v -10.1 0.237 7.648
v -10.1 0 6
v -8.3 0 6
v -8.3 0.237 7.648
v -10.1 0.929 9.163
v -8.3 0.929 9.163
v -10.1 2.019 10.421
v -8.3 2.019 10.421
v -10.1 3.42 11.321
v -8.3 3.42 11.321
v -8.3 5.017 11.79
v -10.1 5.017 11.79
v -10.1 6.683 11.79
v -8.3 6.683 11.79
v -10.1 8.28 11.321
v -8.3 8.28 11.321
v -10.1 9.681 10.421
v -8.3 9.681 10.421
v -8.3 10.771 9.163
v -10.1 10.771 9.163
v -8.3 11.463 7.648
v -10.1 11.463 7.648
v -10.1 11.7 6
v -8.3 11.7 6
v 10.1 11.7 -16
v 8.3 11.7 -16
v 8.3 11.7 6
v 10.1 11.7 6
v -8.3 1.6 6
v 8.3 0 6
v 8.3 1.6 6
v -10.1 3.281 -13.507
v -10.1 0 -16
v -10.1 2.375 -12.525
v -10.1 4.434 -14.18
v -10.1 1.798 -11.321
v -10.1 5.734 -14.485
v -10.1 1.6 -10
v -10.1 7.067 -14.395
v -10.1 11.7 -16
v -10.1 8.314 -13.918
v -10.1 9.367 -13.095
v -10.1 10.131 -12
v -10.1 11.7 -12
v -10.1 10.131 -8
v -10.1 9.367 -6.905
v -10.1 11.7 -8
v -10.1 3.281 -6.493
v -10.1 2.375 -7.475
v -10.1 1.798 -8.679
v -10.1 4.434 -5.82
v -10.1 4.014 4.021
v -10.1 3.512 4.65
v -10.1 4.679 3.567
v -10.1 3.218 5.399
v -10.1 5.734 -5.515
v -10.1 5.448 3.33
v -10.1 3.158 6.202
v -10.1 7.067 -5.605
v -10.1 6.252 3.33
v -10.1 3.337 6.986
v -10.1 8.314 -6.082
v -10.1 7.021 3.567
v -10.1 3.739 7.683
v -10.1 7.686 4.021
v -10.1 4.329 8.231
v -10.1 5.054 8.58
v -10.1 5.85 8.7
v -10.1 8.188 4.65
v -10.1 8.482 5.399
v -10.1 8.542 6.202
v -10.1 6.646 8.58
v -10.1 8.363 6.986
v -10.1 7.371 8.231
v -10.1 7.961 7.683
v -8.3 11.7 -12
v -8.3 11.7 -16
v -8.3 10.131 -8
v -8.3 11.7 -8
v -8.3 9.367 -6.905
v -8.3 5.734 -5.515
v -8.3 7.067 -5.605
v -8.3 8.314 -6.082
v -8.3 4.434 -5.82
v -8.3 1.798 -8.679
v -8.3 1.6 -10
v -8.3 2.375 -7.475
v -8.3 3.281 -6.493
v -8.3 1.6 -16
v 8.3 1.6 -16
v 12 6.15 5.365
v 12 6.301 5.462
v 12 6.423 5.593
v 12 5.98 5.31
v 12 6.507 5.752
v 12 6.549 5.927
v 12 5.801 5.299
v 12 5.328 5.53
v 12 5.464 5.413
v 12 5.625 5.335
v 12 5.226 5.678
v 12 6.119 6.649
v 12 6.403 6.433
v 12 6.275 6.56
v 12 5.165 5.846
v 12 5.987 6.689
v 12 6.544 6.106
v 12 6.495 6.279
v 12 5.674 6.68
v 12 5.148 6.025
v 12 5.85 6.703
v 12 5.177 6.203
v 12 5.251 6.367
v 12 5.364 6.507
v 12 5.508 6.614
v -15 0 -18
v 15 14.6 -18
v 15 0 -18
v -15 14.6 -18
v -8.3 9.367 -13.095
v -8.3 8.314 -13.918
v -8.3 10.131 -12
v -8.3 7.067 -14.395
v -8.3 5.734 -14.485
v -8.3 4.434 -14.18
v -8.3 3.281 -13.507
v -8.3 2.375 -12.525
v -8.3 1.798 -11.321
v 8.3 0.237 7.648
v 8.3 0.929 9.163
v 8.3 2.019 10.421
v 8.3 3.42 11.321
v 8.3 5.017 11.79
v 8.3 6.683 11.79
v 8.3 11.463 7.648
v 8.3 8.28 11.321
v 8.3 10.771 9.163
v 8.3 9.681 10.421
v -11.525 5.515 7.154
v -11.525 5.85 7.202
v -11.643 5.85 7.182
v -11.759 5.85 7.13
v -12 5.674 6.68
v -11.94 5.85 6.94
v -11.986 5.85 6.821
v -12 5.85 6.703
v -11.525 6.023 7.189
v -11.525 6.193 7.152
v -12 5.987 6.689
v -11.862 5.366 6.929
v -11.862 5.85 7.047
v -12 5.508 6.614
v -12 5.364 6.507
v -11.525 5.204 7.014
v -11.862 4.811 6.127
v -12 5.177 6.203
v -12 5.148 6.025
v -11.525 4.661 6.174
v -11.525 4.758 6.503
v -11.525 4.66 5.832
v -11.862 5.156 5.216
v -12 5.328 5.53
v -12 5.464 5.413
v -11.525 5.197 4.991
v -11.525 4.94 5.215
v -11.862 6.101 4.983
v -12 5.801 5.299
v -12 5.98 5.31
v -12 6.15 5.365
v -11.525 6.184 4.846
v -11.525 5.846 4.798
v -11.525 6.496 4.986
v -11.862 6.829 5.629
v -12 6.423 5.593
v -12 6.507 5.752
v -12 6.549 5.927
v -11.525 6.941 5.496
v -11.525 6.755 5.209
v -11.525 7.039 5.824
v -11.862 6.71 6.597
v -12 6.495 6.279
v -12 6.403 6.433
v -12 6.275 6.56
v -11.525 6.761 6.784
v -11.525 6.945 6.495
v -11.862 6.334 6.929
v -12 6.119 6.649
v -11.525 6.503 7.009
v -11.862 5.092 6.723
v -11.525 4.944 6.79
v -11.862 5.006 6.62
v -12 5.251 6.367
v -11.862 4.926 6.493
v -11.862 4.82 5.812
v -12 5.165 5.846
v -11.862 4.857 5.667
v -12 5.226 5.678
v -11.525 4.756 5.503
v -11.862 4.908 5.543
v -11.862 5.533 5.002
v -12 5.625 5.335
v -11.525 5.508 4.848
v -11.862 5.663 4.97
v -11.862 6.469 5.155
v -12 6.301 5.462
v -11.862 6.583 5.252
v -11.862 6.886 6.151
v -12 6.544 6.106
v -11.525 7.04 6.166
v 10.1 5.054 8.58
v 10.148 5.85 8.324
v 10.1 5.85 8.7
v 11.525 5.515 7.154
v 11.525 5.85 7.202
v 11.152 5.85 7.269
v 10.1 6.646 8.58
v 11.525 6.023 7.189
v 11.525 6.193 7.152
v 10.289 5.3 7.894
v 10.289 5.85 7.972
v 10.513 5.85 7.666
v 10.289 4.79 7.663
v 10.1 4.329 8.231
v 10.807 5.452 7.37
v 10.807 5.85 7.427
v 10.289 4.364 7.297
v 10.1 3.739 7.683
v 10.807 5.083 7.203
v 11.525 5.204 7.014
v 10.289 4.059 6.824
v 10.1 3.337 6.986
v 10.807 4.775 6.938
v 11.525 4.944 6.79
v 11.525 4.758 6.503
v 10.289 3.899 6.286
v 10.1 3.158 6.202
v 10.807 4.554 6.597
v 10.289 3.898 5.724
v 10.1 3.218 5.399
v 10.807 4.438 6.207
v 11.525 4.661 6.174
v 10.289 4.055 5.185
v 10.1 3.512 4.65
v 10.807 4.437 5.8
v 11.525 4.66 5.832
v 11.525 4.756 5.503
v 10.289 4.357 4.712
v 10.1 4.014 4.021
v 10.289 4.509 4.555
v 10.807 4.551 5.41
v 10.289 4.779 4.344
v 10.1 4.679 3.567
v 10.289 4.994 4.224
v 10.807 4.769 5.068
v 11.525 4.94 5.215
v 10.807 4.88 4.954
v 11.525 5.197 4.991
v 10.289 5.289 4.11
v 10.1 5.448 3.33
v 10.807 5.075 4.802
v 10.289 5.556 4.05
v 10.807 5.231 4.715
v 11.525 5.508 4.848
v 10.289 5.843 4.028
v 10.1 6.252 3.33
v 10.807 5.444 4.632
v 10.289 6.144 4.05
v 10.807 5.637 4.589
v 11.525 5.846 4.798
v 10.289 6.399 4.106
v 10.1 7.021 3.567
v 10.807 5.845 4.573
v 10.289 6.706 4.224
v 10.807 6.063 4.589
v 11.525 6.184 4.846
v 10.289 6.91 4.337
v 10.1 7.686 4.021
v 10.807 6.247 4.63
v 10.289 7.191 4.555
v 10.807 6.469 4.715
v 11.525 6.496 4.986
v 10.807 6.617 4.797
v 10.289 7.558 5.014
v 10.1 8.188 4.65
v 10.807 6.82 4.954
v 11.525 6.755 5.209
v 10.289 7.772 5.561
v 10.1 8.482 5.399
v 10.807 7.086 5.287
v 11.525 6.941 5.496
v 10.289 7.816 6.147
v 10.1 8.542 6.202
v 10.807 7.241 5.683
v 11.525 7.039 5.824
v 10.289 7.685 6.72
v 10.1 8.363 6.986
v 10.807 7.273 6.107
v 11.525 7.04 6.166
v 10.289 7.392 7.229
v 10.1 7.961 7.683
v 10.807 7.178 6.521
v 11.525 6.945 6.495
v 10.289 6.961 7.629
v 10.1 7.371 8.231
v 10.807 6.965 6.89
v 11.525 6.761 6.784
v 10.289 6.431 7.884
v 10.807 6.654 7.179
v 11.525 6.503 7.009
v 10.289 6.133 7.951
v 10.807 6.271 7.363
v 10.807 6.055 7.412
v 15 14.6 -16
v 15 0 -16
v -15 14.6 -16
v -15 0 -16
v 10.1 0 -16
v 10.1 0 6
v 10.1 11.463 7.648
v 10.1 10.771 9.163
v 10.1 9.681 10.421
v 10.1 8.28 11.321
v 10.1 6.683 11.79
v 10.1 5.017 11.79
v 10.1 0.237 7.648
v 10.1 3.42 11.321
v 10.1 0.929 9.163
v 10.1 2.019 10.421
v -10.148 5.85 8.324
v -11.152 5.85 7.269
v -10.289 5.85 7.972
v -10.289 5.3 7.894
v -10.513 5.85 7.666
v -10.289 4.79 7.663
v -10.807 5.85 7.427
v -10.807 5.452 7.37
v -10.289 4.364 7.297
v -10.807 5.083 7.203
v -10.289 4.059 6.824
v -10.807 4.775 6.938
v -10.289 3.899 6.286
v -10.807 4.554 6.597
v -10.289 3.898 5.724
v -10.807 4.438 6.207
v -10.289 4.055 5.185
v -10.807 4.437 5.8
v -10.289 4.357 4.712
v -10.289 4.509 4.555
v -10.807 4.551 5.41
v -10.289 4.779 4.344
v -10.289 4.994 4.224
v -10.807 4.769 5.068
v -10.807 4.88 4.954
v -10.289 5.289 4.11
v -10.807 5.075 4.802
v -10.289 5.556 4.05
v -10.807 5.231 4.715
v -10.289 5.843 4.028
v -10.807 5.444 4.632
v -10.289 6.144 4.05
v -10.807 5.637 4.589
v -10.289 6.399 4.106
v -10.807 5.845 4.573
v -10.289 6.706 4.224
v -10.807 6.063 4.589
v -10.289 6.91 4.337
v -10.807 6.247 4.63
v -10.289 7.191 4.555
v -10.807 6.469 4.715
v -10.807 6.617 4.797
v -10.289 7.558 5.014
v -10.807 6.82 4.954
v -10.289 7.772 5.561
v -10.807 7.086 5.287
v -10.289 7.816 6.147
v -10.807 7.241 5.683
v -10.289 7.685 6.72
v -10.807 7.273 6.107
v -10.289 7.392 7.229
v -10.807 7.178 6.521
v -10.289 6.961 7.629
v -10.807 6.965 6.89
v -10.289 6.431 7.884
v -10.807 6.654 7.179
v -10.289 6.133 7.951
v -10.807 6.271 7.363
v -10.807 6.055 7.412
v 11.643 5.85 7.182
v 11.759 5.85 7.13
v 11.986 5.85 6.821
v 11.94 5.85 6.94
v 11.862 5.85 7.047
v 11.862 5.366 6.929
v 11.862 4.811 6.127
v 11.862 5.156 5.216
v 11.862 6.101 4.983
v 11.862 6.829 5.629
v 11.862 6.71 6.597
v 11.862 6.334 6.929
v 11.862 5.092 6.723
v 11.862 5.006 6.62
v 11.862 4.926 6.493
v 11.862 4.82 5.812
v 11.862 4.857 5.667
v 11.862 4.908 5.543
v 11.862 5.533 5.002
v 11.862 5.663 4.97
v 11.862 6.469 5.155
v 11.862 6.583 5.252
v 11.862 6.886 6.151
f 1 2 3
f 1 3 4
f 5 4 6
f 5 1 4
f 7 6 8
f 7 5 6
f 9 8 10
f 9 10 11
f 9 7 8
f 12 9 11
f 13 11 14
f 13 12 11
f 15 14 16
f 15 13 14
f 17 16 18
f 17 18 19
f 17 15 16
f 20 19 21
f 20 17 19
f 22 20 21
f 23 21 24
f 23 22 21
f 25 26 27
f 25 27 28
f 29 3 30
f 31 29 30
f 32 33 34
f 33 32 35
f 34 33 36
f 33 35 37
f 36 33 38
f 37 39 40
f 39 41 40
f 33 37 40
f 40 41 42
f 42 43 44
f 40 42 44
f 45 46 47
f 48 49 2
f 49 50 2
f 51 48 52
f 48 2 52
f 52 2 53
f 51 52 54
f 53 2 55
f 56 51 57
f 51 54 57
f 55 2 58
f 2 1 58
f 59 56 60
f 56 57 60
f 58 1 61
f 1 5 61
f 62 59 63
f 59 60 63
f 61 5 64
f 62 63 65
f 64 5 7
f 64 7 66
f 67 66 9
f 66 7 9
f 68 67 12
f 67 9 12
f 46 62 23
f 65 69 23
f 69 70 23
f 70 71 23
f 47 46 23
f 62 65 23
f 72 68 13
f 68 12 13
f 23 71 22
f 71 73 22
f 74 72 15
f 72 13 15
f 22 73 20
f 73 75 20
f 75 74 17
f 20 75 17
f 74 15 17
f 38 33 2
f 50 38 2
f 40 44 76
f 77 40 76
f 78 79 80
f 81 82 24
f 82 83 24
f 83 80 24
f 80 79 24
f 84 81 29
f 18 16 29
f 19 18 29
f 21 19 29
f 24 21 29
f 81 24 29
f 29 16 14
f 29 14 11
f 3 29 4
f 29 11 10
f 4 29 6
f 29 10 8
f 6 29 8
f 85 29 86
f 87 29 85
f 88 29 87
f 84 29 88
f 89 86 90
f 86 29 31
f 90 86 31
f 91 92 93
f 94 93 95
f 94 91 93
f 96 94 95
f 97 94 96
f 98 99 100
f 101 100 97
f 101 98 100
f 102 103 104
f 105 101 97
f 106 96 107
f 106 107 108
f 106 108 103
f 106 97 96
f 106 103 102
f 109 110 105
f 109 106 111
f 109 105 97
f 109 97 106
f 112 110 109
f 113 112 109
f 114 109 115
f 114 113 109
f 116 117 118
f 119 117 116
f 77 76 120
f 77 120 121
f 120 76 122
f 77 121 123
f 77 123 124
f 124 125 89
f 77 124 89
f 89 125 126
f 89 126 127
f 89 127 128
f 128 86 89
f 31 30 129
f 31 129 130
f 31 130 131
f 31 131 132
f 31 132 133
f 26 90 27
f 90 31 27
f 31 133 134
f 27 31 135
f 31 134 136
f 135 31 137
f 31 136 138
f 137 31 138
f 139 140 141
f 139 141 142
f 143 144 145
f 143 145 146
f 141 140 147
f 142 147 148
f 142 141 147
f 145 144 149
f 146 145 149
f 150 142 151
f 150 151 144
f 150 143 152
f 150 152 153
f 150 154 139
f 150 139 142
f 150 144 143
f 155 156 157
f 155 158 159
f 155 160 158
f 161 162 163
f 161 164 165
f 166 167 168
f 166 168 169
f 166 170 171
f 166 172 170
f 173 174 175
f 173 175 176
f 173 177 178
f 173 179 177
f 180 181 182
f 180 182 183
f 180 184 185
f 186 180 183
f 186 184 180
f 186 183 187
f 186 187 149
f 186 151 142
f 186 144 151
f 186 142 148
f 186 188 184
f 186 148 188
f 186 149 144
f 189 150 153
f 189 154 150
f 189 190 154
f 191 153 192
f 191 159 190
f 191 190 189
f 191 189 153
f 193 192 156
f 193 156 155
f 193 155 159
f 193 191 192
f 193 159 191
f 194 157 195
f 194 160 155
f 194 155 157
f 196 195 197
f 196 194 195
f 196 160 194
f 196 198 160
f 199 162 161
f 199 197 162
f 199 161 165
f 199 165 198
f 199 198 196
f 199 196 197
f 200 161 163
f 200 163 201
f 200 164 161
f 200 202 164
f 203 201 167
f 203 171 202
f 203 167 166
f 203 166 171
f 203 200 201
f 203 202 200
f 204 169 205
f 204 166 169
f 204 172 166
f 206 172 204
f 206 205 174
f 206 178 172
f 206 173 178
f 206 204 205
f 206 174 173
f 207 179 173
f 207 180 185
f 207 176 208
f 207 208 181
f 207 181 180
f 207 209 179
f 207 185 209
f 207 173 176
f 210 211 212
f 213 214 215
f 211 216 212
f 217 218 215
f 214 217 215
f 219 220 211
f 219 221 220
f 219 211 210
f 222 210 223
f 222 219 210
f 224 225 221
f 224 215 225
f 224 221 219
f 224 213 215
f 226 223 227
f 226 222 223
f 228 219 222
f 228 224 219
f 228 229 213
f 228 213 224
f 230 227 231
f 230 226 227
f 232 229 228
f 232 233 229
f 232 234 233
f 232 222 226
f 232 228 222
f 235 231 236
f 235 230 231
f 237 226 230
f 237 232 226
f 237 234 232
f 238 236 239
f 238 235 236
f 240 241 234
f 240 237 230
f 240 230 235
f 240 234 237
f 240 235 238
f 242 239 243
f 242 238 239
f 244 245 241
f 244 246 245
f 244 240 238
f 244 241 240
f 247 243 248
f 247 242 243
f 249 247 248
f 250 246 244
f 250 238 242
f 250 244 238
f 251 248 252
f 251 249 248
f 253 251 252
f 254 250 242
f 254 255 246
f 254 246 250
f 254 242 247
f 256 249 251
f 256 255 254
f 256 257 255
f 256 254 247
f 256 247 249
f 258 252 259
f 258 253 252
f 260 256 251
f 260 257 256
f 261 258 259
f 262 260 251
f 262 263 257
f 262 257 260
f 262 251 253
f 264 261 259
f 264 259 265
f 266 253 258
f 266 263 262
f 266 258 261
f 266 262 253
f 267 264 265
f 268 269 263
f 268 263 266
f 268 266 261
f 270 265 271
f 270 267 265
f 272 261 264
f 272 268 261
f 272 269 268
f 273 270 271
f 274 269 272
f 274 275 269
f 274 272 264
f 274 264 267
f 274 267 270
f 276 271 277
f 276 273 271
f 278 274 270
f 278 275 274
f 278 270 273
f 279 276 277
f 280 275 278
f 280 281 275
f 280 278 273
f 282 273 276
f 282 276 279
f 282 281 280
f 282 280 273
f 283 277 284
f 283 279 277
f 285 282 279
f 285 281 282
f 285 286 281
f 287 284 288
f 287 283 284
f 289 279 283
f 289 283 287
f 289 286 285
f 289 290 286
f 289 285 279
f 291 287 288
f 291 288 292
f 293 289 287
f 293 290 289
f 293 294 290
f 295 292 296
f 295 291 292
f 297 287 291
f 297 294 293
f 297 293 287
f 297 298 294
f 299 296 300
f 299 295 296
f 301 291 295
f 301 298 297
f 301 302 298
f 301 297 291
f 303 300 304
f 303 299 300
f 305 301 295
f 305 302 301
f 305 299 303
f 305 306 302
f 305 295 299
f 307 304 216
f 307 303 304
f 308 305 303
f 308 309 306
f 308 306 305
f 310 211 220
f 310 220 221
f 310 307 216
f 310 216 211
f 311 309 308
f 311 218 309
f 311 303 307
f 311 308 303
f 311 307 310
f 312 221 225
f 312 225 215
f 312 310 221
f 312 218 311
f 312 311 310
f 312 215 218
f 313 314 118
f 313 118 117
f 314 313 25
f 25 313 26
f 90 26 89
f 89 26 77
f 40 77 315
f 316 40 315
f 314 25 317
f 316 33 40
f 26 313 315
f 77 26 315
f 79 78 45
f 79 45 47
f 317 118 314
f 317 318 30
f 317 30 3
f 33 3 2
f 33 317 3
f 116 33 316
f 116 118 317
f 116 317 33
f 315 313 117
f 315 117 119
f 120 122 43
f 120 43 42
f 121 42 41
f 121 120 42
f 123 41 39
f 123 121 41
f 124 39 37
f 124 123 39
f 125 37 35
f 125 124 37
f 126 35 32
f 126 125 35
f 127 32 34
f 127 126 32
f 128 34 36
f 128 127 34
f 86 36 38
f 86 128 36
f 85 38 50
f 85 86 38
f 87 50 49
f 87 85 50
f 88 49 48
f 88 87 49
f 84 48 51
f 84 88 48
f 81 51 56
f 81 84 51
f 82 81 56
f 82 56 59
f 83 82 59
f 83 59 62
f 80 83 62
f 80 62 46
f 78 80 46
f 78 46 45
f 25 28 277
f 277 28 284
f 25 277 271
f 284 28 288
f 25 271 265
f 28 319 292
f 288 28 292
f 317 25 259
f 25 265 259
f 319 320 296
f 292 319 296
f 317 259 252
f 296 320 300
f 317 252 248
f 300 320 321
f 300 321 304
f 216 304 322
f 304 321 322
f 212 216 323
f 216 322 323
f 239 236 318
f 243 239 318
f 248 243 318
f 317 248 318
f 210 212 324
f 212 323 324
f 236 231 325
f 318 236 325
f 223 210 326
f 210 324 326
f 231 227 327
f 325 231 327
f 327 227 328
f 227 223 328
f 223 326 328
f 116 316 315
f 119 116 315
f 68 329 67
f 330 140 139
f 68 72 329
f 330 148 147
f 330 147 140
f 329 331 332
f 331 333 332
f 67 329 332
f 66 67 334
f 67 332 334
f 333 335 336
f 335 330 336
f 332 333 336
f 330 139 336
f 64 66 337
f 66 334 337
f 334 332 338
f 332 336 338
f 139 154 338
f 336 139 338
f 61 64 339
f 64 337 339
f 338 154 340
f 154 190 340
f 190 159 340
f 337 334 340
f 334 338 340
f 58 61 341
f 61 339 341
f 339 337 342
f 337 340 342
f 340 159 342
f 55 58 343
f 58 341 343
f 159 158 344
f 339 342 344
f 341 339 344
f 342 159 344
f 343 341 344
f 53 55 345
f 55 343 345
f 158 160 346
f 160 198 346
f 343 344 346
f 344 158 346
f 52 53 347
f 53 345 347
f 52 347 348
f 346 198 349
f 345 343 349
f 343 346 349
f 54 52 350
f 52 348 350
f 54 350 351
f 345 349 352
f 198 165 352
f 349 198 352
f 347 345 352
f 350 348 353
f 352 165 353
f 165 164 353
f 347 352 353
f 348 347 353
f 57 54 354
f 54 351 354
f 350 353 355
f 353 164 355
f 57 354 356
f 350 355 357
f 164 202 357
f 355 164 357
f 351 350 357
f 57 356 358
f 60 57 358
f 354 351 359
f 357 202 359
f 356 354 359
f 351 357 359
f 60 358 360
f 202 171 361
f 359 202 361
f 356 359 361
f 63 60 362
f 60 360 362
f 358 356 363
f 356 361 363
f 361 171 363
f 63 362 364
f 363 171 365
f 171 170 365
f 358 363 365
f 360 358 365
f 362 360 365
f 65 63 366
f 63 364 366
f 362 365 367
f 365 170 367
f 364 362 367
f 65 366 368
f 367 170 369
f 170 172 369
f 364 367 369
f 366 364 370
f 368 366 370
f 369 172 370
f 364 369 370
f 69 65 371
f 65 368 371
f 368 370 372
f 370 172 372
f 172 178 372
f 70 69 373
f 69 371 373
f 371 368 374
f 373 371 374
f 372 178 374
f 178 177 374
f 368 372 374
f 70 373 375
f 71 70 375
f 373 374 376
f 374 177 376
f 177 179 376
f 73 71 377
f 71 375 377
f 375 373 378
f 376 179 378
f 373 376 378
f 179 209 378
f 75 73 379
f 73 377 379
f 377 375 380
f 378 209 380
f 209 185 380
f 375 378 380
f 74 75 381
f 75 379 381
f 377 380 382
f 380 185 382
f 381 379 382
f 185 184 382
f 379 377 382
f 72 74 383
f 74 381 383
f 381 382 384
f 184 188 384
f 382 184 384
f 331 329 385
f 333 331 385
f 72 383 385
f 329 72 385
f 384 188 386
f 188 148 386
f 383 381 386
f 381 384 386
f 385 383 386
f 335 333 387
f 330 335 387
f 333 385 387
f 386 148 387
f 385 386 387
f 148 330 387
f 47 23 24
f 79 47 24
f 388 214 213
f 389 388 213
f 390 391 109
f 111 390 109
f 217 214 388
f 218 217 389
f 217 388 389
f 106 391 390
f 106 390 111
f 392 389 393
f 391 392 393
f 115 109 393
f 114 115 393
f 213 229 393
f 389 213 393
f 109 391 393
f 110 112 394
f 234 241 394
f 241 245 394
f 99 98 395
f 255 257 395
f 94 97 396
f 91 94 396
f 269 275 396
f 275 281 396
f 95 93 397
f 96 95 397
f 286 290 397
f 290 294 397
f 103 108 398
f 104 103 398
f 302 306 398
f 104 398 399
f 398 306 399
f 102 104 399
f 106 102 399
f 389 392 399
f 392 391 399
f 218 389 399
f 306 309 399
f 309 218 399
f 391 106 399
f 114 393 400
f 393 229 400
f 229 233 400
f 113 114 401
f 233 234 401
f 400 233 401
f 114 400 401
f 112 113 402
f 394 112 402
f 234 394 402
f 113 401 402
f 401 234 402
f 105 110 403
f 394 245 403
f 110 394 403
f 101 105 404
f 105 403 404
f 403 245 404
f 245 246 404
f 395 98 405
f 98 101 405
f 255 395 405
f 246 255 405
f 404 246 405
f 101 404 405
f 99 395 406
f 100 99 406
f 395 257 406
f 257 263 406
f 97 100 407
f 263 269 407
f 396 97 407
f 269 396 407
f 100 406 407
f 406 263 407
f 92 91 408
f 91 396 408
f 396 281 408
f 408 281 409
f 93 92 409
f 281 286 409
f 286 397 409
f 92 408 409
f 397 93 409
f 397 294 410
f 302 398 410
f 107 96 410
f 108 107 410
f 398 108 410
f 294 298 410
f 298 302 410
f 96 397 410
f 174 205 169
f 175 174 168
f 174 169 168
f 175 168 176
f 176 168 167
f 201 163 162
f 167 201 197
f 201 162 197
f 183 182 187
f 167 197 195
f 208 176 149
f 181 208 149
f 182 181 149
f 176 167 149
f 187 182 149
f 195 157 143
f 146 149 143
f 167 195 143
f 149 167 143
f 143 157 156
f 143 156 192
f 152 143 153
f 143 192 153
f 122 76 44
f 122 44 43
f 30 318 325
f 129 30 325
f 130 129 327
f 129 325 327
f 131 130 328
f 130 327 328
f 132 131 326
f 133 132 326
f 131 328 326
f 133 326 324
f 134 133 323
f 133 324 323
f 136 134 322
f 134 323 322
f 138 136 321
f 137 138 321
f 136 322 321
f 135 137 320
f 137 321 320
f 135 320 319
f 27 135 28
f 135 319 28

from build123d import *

# Parameters (mm, degrees)
SKETCH1_W           = 20.2
SKETCH1_H           = 12
BOSS_EXTRUDE1_DEPTH = 1.6
BOSS_EXTRUDE2_DEPTH = 1.8
SKETCH3_R           = 1.2
BOSS_EXTRUDE3_DEPTH = 1.9
FILLET1_R           = 1.5
FILLET2_R           = 0.5
FILLET3_R           = 1.5
FILLET4_R           = 0.5
BOSS_EXTRUDE4_DEPTH = 10
SKETCH5_W           = 30
SKETCH5_H           = 17.5
BOSS_EXTRUDE5_DEPTH = 2
CUT_EXTRUDE1_DEPTH  = 2
SKETCH8_W           = 30
SKETCH8_H           = 2.9
CUT_EXTRUDE3_DEPTH  = 2


with BuildPart() as part:
    # Sketch1 → Boss-Extrude1 (new body)
    with BuildSketch(Plane(origin=(0, 0, 0), x_dir=(1, 0, 0), z_dir=(0, 1, 0))):
        Rectangle(SKETCH1_W, SKETCH1_H)
    extrude(amount=BOSS_EXTRUDE1_DEPTH)

    # Sketch2 → Boss-Extrude2 (add)
    with BuildSketch(Plane(origin=(10.1, 0, 0), x_dir=(0, 0, -1), z_dir=(1, 0, 0))):
        with BuildLine():
            Line((-6, 11.7), (6, 11.7))
            Line((6, 11.7), (6, 0))
            Line((6, 0), (-6, 0))
            ThreePointArc((-6, 0), (-11.85, 5.85), (-6, 11.7))
        make_face()
    boss_extrude2 = extrude(amount=-BOSS_EXTRUDE2_DEPTH)

    # Sketch3 → Boss-Extrude3 (add)
    with BuildSketch(Plane(origin=(10.1, 0, 0), x_dir=(0, 0, -1), z_dir=(1, 0, 0))):
        with Locations(Location((-6, 5.85, 0), (0, 0, 180))):
            Circle(SKETCH3_R)
    boss_extrude3 = extrude(amount=BOSS_EXTRUDE3_DEPTH)

    # Fillet1
    fillet1_edges = [part.edges().sort_by_distance(p)[0] for p in [
        (10.1, 5.85, 4.8),
    ]]
    fillet(fillet1_edges, radius=FILLET1_R)

    # Fillet2
    fillet2_edges = [part.edges().sort_by_distance(p)[0] for p in [
        (12, 5.85, 4.8),
    ]]
    fillet(fillet2_edges, radius=FILLET2_R)

    # Mirror2: Boss-Extrude2, Boss-Extrude3 across plane
    add(boss_extrude2.mirror(Plane(origin=(0, 0, 0), x_dir=(0, 0, 1), z_dir=(1, 0, 0))))
    add(boss_extrude3.mirror(Plane(origin=(0, 0, 0), x_dir=(0, 0, 1), z_dir=(1, 0, 0))))

    # Fillet3
    fillet3_edges = [part.edges().sort_by_distance(p)[0] for p in [
        (-10.1, 5.85, 4.8),
    ]]
    fillet(fillet3_edges, radius=FILLET3_R)

    # Fillet4
    fillet4_edges = [part.edges().sort_by_distance(p)[0] for p in [
        (-12, 5.85, 4.8),
    ]]
    fillet(fillet4_edges, radius=FILLET4_R)

    # Sketch4 → Boss-Extrude4 (add)
    with BuildSketch(Plane(origin=(0, 0, -6), x_dir=(-1, 0, 0), z_dir=(0, 0, -1))):
        Polygon((10.1, 0), (10.1, 11.7), (8.3, 11.7), (8.3, 1.6), (-8.3, 1.6), (-8.3, 11.7), (-10.1, 11.7), (-10.1, 0), align=None)
    extrude(amount=BOSS_EXTRUDE4_DEPTH)

    # Sketch5 → Boss-Extrude5 (add)
    with BuildSketch(Plane(origin=(0, 0, -16), x_dir=(-1, 0, 0), z_dir=(0, 0, -1))):
        with Locations((0, 5.85)):
            Rectangle(SKETCH5_W, SKETCH5_H)
    extrude(amount=BOSS_EXTRUDE5_DEPTH)

    # Sketch7 → Cut-Extrude1 (cut)
    with BuildSketch(Plane(origin=(-8.3, 0, 0), x_dir=(0, 0, -1), z_dir=(1, 0, 0))):
        with BuildLine():
            Line((8, 11.7), (12, 11.7))
            Line((12, 11.7), (12, 10.131128874))
            ThreePointArc((12, 10.131128874), (10, 1.6), (8, 10.131128874))
            Line((8, 10.131128874), (8, 11.7))
        make_face()
    extrude(amount=-CUT_EXTRUDE1_DEPTH, mode=Mode.SUBTRACT)

    # Sketch8 → Cut-Extrude3 (cut)
    with BuildSketch(Plane(origin=(0, 0, -18), x_dir=(-1, 0, 0), z_dir=(0, 0, -1))):
        with Locations((0, -1.45)):
            Rectangle(SKETCH8_W, SKETCH8_H)
    extrude(amount=-CUT_EXTRUDE3_DEPTH, mode=Mode.SUBTRACT)


solid = part.part
